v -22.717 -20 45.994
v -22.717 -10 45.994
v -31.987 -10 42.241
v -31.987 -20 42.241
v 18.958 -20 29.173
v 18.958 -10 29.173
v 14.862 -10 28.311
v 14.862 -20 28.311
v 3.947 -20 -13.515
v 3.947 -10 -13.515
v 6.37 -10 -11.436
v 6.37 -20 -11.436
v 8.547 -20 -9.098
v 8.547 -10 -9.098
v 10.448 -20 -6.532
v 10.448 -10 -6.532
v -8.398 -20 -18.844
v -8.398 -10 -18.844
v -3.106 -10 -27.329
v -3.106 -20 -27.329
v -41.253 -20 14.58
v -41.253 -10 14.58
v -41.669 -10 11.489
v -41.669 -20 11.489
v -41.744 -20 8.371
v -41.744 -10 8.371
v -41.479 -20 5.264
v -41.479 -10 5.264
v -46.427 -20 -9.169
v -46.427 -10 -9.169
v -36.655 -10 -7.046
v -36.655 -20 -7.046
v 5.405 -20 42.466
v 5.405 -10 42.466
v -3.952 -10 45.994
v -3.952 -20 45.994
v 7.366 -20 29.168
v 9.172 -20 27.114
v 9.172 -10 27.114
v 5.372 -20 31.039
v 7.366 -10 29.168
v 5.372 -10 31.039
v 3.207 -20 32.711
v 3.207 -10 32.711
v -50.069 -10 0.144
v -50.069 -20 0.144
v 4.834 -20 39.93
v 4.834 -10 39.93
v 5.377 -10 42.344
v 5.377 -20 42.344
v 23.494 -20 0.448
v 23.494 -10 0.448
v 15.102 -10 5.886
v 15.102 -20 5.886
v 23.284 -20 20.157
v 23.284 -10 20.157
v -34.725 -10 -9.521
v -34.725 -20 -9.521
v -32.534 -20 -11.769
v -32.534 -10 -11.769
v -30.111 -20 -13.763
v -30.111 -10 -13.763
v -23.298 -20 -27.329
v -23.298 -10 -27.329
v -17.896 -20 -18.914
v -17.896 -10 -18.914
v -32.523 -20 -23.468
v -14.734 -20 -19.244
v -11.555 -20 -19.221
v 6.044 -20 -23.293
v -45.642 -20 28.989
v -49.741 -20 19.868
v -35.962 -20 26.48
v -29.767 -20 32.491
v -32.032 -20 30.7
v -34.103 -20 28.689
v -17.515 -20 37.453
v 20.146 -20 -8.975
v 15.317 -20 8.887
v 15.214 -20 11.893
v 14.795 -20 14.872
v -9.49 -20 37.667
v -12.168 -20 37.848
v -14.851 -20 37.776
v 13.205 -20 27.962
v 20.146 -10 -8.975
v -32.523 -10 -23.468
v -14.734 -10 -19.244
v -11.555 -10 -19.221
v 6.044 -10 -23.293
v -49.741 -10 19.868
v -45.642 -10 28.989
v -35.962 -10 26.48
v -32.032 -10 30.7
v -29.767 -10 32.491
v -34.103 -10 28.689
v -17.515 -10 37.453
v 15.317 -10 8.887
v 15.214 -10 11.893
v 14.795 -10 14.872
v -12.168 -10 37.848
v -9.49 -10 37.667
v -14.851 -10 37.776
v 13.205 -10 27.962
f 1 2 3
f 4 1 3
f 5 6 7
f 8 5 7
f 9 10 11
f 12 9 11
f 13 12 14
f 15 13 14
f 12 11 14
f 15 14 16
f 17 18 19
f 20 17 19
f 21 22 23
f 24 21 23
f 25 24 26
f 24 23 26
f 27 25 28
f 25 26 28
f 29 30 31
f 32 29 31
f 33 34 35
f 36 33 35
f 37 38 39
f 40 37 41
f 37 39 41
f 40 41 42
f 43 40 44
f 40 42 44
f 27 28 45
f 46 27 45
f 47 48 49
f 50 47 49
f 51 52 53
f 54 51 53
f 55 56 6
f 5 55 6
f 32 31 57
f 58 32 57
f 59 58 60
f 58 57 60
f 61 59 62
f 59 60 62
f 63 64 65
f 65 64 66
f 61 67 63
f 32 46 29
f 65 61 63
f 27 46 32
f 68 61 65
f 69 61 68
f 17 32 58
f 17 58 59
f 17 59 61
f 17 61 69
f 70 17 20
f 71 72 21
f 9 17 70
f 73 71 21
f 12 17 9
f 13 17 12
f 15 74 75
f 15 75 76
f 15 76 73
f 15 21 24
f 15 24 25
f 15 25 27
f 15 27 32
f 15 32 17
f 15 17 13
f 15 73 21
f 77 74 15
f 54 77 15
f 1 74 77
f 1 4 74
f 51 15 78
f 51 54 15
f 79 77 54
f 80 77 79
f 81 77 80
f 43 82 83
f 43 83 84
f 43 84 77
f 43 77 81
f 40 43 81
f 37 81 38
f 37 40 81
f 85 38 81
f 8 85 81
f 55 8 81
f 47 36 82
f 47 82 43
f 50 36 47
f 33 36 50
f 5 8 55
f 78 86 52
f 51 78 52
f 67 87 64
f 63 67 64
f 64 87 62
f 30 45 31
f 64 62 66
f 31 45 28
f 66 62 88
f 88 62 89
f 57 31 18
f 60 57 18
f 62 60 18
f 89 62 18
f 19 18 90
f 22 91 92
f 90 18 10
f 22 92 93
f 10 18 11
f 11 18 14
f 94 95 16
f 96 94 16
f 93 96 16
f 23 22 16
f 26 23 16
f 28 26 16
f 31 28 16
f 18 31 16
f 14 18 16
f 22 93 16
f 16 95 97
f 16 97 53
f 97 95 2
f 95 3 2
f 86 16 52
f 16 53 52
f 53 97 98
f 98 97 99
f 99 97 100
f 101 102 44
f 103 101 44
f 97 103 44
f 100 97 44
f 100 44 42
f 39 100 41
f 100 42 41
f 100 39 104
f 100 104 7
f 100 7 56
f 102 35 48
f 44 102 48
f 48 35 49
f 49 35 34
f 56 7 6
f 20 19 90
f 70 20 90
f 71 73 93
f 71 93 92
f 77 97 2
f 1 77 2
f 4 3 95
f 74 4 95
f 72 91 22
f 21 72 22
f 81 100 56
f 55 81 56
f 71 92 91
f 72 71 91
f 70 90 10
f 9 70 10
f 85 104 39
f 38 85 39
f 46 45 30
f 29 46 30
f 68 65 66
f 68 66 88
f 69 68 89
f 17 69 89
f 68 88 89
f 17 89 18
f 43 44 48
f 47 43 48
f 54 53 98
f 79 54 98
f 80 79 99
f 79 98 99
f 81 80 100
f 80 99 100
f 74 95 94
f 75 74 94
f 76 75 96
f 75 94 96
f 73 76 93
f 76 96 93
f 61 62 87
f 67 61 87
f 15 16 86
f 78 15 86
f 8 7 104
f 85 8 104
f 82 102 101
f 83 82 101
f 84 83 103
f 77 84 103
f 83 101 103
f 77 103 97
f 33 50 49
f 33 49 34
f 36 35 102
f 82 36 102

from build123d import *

# Parameters (mm, degrees)
F0_R     = 10.5352835121
F1_DEPTH = 10
F2_R     = 10.5352835121
F4_DEPTH = 10


with BuildPart() as f1:
    # F0 (on Front) → F1 (new body)
    with BuildSketch(Plane.XZ):
        with BuildLine():
            ThreePointArc((27.7799711237, -2.671018116), (28.1744534053, 0.0443174404), (28.3063539053, 2.7849862844))
            ThreePointArc((28.3063539053, 2.7849862844), (28.0187327637, 6.8265473039), (27.1616666974, 10.7866456806))
            ThreePointArc((27.1616666974, 10.7866456806), (25.7257105116, 14.6441244213), (23.7497903046, 18.2549209731))
            ThreePointArc((23.7497903046, 18.2549209731), (19.361792777, 23.5343393933), (13.840033917, 27.6131823971))
            ThreePointArc((13.840033917, 27.6131823971), (10.2093532061, 29.3452118388), (6.3712126192, 30.5495561611))
            ThreePointArc((6.3712126192, 30.5495561611), (-0.2384881302, 31.3241628205), (-6.8478808449, 30.5469322125))
            ThreePointArc((-6.8478808449, 30.5469322125), (-10.969919952, 29.2273648204), (-14.8450148239, 27.2996448624))
            ThreePointArc((-14.8450148239, 27.2996448624), (-20.0530528407, 23.3189368581), (-24.2154366907, 18.2549209731))
            ThreePointArc((-24.2154366907, 18.2549209731), (-26.4192319908, 14.132083875), (-27.9203856002, 9.7047780009))
            ThreePointArc((-27.9203856002, 9.7047780009), (-28.7702301145, 3.1028473381), (-28.0676480896, -3.5163748724))
            ThreePointArc((-28.0676480896, -3.5163748724), (-26.6541111331, -8.0039049024), (-24.5224980596, -12.1982151202))
            ThreePointArc((-24.5224980596, -12.1982151202), (-20.3786644673, -17.4296051981), (-15.133187526, -21.555592431))
            ThreePointArc((-15.133187526, -21.555592431), (-10.8750457734, -23.6957185401), (-6.3201455519, -25.0974299658))
            ThreePointArc((-6.3201455519, -25.0974299658), (0.4193178956, -25.7467388904), (7.122076621, -24.7901851235))
            ThreePointArc((7.122076621, -24.7901851235), (11.5833738131, -23.1931221487), (15.7189210631, -20.8798924315))
            ThreePointArc((15.7189210631, -20.8798924315), (20.7808637814, -16.5258808424), (24.6926258312, -11.1148921464))
            ThreePointArc((24.6926258312, -11.1148921464), (26.5708921122, -7.0152930628), (27.7799711237, -2.671018116))
        make_face()
        with Locations((-0.2328231931, 2.7849862844)):
            Circle(F0_R, mode=Mode.SUBTRACT)
        with BuildLine():
            ThreePointArc((-24.2154366907, 18.2549209731), (-20.0530528407, 23.3189368581), (-14.8450148239, 27.2996448624))
            Line((-14.8450148239, 27.2996448624), (-22.8760878199, 33.2579891401))
            Line((-22.8760878199, 33.2579891401), (-30.0983452841, 26.3414150516))
            Line((-30.0983452841, 26.3414150516), (-24.2154366907, 18.2549209731))
        make_face()
        with BuildLine():
            ThreePointArc((-28.0676480896, -3.5163748724), (-28.7702301145, 3.1028473381), (-27.9203856002, 9.7047780009))
            Line((-27.9203856002, 9.7047780009), (-37.8038170807, 8.1823515919))
            Line((-37.8038170807, 8.1823515919), (-37.9221875331, -1.8169478053))
            Line((-37.9221875331, -1.8169478053), (-28.0676480896, -3.5163748724))
        make_face()
        with BuildLine():
            Line((-23.298226533, -27.3289916042), (-15.133187526, -21.555592431))
            ThreePointArc((-15.133187526, -21.555592431), (-20.3786644673, -17.4296051981), (-24.5224980596, -12.1982151202))
            Line((-24.5224980596, -12.1982151202), (-30.3999287678, -20.2886915134))
            Line((-30.3999287678, -20.2886915134), (-23.298226533, -27.3289916042))
        make_face()
        with BuildLine():
            Line((5.3968944368, -34.640248394), (7.122076621, -24.7901851235))
            ThreePointArc((7.122076621, -24.7901851235), (0.4193178956, -25.7467388904), (-6.3201455519, -25.0974299658))
            Line((-6.3201455519, -25.0974299658), (-4.5983661602, -34.9480886101))
            Line((-4.5983661602, -34.9480886101), (5.3968944368, -34.640248394))
        make_face()
        with BuildLine():
            Line((30.4305433725, -19.3049044961), (24.6926258312, -11.1148921464))
            ThreePointArc((24.6926258312, -11.1148921464), (20.7808637814, -16.5258808424), (15.7189210631, -20.8798924315))
            Line((15.7189210631, -20.8798924315), (23.7909685899, -26.7826078003))
            Line((23.7909685899, -26.7826078003), (30.4305433725, -19.3049044961))
        make_face()
        with BuildLine():
            ThreePointArc((27.1616666974, 10.7866456806), (28.0187327637, 6.8265473039), (28.3063539053, 2.7849862844))
            ThreePointArc((28.3063539053, 2.7849862844), (28.1744534053, 0.0443174404), (27.7799711237, -2.671018116))
            Line((27.7799711237, -2.671018116), (37.6319898333, -0.9570381434))
            Line((37.6319898333, -0.9570381434), (37.004966841, 9.0232846052))
            Line((37.004966841, 9.0232846052), (27.1616666974, 10.7866456806))
        make_face()
        with BuildLine():
            ThreePointArc((13.840033917, 27.6131823971), (19.361792777, 23.5343393933), (23.7497903046, 18.2549209731))
            Line((23.7497903046, 18.2549209731), (29.4473420196, 26.4730658036))
            Line((29.4473420196, 26.4730658036), (22.097377097, 33.2537748843))
            Line((22.097377097, 33.2537748843), (13.840033917, 27.6131823971))
        make_face()
        with BuildLine():
            ThreePointArc((-6.8478808449, 30.5469322125), (-0.2384881302, 31.3241628205), (6.3712126192, 30.5495561611))
            Line((6.3712126192, 30.5495561611), (4.7536209633, 40.4178588133))
            Line((4.7536209633, 40.4178588133), (-5.2463790367, 40.4178588133))
            Line((-5.2463790367, 40.4178588133), (-6.8478808449, 30.5469322125))
        make_face()
    extrude(amount=F1_DEPTH)


with BuildPart() as f4:
    # F2 (on face) → F4 (new body)
    with BuildSketch(Plane.XZ.offset(10)):
        with BuildLine():
            Line((6.0436061547, -23.2930321543), (3.9465958394, -13.5153766205))
            ThreePointArc((3.9465958394, -13.5153766205), (7.4913970999, -10.2975314551), (10.4484246026, -6.5324110277))
            Line((10.4484246026, -6.5324110277), (20.145561814, -8.9748544564))
            Line((20.145561814, -8.9748544564), (23.4940421304, 0.4478669961))
            Line((23.4940421304, 0.4478669961), (15.1021918552, 5.8863271605))
            ThreePointArc((15.1021918552, 5.8863271605), (15.3048791393, 10.3911595364), (14.795466022, 14.8716835175))
            Line((14.795466022, 14.8716835175), (23.2844256021, 20.1572833176))
            Line((23.2844256021, 20.1572833176), (18.9582119637, 29.1730403882))
            Line((18.9582119637, 29.1730403882), (14.8616590906, 28.3110547216))
            Line((14.8616590906, 28.3110547216), (13.840033917, 27.6131823971))
            ThreePointArc((13.840033917, 27.6131823971), (13.5236804737, 27.7898505375), (13.2051095461, 27.9624880101))
            Line((13.2051095461, 27.9624880101), (9.1724991444, 27.1139569468))
            ThreePointArc((9.1724991444, 27.1139569468), (6.3915510384, 30.1271942866), (3.2074944908, 32.7108071709))
            Line((3.2074944908, 32.7108071709), (4.8336037454, 39.9299147155))
            Line((4.8336037454, 39.9299147155), (4.7536209633, 40.4178588133))
            Line((4.7536209633, 40.4178588133), (-5.2463790367, 40.4178588133))
            Line((-5.2463790367, 40.4178588133), (-6.8478808449, 30.5469322125))
            ThreePointArc((-6.8478808449, 30.5469322125), (-10.969919952, 29.2273648204), (-14.8450148239, 27.2996448624))
            Line((-14.8450148239, 27.2996448624), (-22.8760878199, 33.2579891401))
            Line((-22.8760878199, 33.2579891401), (-30.0983452841, 26.3414150516))
            Line((-30.0983452841, 26.3414150516), (-24.2154366907, 18.2549209731))
            ThreePointArc((-24.2154366907, 18.2549209731), (-26.4192319908, 14.132083875), (-27.9203856002, 9.7047780009))
            Line((-27.9203856002, 9.7047780009), (-37.8038170807, 8.1823515919))
            Line((-37.8038170807, 8.1823515919), (-37.9221875331, -1.8169478053))
            Line((-37.9221875331, -1.8169478053), (-28.0676480896, -3.5163748724))
            ThreePointArc((-28.0676480896, -3.5163748724), (-26.6541111331, -8.0039049024), (-24.5224980596, -12.1982151202))
            Line((-24.5224980596, -12.1982151202), (-30.3999287678, -20.2886915134))
            Line((-30.3999287678, -20.2886915134), (-23.298226533, -27.3289916042))
            Line((-23.298226533, -27.3289916042), (-17.896228959, -18.9136233882))
            ThreePointArc((-17.896228959, -18.9136233882), (-13.1442498661, -19.2768415054), (-8.3980860704, -18.8442193547))
            Line((-8.3980860704, -18.8442193547), (-3.10576712, -27.3289916042))
            Line((-3.10576712, -27.3289916042), (6.0436061547, -23.2930321543))
        make_face()
        with Locations((-0.2328231931, 2.7849862844)):
            Circle(F2_R, mode=Mode.SUBTRACT)
        with BuildLine():
            Line((-32.5227899129, -23.4679774305), (-23.298226533, -27.3289916042))
            Line((-23.298226533, -27.3289916042), (-30.3999287678, -20.2886915134))
            Line((-30.3999287678, -20.2886915134), (-24.5224980596, -12.1982151202))
            ThreePointArc((-24.5224980596, -12.1982151202), (-26.6541111331, -8.0039049024), (-28.0676480896, -3.5163748724))
            Line((-28.0676480896, -3.5163748724), (-37.9221875331, -1.8169478053))
            Line((-37.9221875331, -1.8169478053), (-37.8038170807, 8.1823515919))
            Line((-37.8038170807, 8.1823515919), (-27.9203856002, 9.7047780009))
            ThreePointArc((-27.9203856002, 9.7047780009), (-26.4192319908, 14.132083875), (-24.2154366907, 18.2549209731))
            Line((-24.2154366907, 18.2549209731), (-30.0983452841, 26.3414150516))
            Line((-30.0983452841, 26.3414150516), (-22.8760878199, 33.2579891401))
            Line((-22.8760878199, 33.2579891401), (-14.8450148239, 27.2996448624))
            ThreePointArc((-14.8450148239, 27.2996448624), (-10.969919952, 29.2273648204), (-6.8478808449, 30.5469322125))
            Line((-6.8478808449, 30.5469322125), (-5.2463790367, 40.4178588133))
            Line((-5.2463790367, 40.4178588133), (4.7536209633, 40.4178588133))
            Line((4.7536209633, 40.4178588133), (4.8336037454, 39.9299147155))
            Line((4.8336037454, 39.9299147155), (5.3773912439, 42.3440578129))
            Line((5.3773912439, 42.3440578129), (5.4049445449, 42.4663806169))
            Line((5.4049445449, 42.4663806169), (-3.952331747, 45.9936147169))
            Line((-3.952331747, 45.9936147169), (-9.4897229207, 37.6667125925))
            ThreePointArc((-9.4897229207, 37.6667125925), (-13.5099465153, 37.8436589686), (-17.5150931781, 37.4533924182))
            Line((-17.5150931781, 37.4533924182), (-22.7174583218, 45.9936147169))
            Line((-22.7174583218, 45.9936147169), (-31.9867384026, 42.2412225755))
            Line((-31.9867384026, 42.2412225755), (-29.767256543, 32.4906379635))
            ThreePointArc((-29.767256543, 32.4906379635), (-33.0929366105, 29.720743274), (-35.9615144592, 26.4797980987))
            Line((-35.9615144592, 26.4797980987), (-45.6415453785, 28.9891807718))
            Line((-45.6415453785, 28.9891807718), (-49.7406882781, 19.867940314))
            Line((-49.7406882781, 19.867940314), (-41.2532858507, 14.5798404628))
            ThreePointArc((-41.2532858507, 14.5798404628), (-41.7489952856, 9.9313168673), (-41.4791578337, 5.2642313516))
            Line((-41.4791578337, 5.2642313516), (-50.0691131996, 0.1444006111))
            Line((-50.0691131996, 0.1444006111), (-46.4267048395, -9.168647297))
            Line((-46.4267048395, -9.168647297), (-36.6545645454, -7.0460842067))
            ThreePointArc((-36.6545645454, -7.0460842067), (-33.660420308, -10.6752869818), (-30.1106987778, -13.7632457827))
            Line((-30.1106987778, -13.7632457827), (-32.5227899129, -23.4679774305))
        make_face()
        with BuildLine():
            Line((13.840033917, 27.6131823971), (14.8616590906, 28.3110547216))
            Line((14.8616590906, 28.3110547216), (13.2051095461, 27.9624880101))
            ThreePointArc((13.2051095461, 27.9624880101), (13.5236804737, 27.7898505375), (13.840033917, 27.6131823971))
        make_face()
        with Locations((-0.2328231931, 2.7849862844)):
            Circle(F2_R)
    extrude(amount=F4_DEPTH)


solid = f4.part
